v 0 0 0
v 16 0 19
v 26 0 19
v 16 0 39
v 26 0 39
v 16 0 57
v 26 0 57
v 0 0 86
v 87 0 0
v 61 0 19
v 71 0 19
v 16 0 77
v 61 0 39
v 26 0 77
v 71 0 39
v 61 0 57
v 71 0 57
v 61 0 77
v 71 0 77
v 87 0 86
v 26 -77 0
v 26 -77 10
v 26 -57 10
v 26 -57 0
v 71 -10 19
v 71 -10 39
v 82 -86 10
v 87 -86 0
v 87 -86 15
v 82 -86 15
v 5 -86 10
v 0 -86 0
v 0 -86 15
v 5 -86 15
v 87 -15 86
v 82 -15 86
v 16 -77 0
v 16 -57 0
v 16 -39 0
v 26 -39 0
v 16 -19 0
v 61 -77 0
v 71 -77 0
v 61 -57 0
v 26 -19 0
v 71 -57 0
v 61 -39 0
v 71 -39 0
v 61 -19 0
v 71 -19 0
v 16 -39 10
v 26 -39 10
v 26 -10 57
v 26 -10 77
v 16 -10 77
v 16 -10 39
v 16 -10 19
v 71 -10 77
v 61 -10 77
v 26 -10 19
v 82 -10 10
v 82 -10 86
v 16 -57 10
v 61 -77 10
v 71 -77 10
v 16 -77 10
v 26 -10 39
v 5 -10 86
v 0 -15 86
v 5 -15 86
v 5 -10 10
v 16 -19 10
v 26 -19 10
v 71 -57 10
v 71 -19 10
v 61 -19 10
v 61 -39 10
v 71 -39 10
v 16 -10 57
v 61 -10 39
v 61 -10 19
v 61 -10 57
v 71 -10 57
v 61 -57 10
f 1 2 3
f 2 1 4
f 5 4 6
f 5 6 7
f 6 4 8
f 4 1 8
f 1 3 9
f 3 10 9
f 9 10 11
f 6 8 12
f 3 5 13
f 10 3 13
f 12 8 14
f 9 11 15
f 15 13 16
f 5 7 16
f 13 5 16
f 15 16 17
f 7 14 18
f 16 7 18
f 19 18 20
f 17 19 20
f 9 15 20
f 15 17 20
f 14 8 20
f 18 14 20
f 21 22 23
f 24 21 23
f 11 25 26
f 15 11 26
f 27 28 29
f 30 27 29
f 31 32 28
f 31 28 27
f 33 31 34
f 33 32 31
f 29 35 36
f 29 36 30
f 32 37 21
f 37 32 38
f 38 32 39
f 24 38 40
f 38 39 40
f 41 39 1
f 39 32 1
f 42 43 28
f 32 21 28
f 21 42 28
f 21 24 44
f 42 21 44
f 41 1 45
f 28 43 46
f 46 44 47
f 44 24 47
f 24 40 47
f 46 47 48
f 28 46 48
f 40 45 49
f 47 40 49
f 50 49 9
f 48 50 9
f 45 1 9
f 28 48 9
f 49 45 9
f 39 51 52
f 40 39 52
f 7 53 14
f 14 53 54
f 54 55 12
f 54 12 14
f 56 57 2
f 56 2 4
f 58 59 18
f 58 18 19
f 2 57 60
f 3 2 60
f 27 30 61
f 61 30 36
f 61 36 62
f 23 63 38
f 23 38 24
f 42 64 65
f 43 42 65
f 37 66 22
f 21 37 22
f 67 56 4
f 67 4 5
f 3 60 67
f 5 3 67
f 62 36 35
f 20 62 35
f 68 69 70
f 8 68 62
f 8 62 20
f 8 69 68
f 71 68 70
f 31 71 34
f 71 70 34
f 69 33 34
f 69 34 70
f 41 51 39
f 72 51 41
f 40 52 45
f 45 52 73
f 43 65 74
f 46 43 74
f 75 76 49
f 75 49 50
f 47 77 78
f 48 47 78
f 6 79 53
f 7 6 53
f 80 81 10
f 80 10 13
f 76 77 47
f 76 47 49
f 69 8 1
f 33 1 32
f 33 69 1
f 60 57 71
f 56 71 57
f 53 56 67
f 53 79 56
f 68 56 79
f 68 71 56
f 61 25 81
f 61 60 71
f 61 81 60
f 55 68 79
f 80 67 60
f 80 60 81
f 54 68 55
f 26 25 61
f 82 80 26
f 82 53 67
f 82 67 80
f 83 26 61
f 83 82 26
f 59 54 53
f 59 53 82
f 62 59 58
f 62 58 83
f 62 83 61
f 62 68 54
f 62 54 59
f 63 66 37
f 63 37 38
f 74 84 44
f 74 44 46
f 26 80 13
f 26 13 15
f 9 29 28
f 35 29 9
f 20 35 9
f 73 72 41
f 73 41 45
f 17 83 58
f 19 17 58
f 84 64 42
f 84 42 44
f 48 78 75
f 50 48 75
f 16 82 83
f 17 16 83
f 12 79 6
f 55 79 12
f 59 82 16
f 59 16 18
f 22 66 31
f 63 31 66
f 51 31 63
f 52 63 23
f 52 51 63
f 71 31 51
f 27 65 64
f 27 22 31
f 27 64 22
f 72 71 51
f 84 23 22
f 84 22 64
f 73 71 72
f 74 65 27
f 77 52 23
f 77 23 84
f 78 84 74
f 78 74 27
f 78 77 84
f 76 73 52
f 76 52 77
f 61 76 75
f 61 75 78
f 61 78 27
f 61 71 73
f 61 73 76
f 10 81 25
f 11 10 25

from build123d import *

# Parameters (mm, degrees)
F0_W      = 87
F0_H      = 86
F1_DEPTH  = 10
F2_W      = 87
F2_H      = 10
F3_DEPTH  = 76
F5_DEPTH  = 5
F7_DEPTH  = 5
F8_W      = 10
F8_H      = 19.999996
F8_H_2    = 20
F9_DEPTH  = 25
F10_W     = 10
F10_H     = 19.999996
F10_H_2   = 20
F11_DEPTH = 25


with BuildPart() as f1:
    # F0 (on Front) → F1 (new body)
    with BuildSketch(Plane.XZ):
        with Locations((43.5, 43)):
            Rectangle(F0_W, F0_H)
    extrude(amount=F1_DEPTH)

    # F2 (on face) → F3 (join)
    with BuildSketch(Plane.XZ.offset(10)):
        with Locations((43.5, 5)):
            Rectangle(F2_W, F2_H)
    extrude(amount=F3_DEPTH)

    # F4 (on face) → F5 (join)
    with BuildSketch(Plane.YZ.offset(87)):
        Polygon((-86, 15), (-86, 10), (-10, 10), (-10, 86), (-15, 86), align=None)
    extrude(amount=-F5_DEPTH)

    # F6 (on face) → F7 (join)
    with BuildSketch(Plane(origin=(0, 0, 0), x_dir=(0, -1, 0), z_dir=(-1, 0, 0))):
        Polygon((15, 86), (10, 86), (10, 10), (86, 10), (86, 15), align=None)
    extrude(amount=-F7_DEPTH)

    # F8 (on face) → F9 (cut)
    with BuildSketch(Plane.XZ.offset(10)):
        with Locations((21, 66.999998)):
            Rectangle(F8_W, F8_H)
        with Locations((21, 29)):
            Rectangle(F8_W, F8_H_2)
        with Locations((66, 66.999996)):
            Rectangle(F8_W, F8_H_2)
        with Locations((66, 29)):
            Rectangle(F8_W, F8_H_2)
    extrude(amount=-F9_DEPTH, mode=Mode.SUBTRACT)

    # F10 (on face) → F11 (cut)
    with BuildSketch(Plane.XY.offset(10)):
        with Locations((21, -29.000002)):
            Rectangle(F10_W, F10_H)
        with Locations((66, -29.000004)):
            Rectangle(F10_W, F10_H_2)
        with Locations((66, -67)):
            Rectangle(F10_W, F10_H_2)
        with Locations((21, -67)):
            Rectangle(F10_W, F10_H_2)
    extrude(amount=-F11_DEPTH, mode=Mode.SUBTRACT)


solid = f1.part
